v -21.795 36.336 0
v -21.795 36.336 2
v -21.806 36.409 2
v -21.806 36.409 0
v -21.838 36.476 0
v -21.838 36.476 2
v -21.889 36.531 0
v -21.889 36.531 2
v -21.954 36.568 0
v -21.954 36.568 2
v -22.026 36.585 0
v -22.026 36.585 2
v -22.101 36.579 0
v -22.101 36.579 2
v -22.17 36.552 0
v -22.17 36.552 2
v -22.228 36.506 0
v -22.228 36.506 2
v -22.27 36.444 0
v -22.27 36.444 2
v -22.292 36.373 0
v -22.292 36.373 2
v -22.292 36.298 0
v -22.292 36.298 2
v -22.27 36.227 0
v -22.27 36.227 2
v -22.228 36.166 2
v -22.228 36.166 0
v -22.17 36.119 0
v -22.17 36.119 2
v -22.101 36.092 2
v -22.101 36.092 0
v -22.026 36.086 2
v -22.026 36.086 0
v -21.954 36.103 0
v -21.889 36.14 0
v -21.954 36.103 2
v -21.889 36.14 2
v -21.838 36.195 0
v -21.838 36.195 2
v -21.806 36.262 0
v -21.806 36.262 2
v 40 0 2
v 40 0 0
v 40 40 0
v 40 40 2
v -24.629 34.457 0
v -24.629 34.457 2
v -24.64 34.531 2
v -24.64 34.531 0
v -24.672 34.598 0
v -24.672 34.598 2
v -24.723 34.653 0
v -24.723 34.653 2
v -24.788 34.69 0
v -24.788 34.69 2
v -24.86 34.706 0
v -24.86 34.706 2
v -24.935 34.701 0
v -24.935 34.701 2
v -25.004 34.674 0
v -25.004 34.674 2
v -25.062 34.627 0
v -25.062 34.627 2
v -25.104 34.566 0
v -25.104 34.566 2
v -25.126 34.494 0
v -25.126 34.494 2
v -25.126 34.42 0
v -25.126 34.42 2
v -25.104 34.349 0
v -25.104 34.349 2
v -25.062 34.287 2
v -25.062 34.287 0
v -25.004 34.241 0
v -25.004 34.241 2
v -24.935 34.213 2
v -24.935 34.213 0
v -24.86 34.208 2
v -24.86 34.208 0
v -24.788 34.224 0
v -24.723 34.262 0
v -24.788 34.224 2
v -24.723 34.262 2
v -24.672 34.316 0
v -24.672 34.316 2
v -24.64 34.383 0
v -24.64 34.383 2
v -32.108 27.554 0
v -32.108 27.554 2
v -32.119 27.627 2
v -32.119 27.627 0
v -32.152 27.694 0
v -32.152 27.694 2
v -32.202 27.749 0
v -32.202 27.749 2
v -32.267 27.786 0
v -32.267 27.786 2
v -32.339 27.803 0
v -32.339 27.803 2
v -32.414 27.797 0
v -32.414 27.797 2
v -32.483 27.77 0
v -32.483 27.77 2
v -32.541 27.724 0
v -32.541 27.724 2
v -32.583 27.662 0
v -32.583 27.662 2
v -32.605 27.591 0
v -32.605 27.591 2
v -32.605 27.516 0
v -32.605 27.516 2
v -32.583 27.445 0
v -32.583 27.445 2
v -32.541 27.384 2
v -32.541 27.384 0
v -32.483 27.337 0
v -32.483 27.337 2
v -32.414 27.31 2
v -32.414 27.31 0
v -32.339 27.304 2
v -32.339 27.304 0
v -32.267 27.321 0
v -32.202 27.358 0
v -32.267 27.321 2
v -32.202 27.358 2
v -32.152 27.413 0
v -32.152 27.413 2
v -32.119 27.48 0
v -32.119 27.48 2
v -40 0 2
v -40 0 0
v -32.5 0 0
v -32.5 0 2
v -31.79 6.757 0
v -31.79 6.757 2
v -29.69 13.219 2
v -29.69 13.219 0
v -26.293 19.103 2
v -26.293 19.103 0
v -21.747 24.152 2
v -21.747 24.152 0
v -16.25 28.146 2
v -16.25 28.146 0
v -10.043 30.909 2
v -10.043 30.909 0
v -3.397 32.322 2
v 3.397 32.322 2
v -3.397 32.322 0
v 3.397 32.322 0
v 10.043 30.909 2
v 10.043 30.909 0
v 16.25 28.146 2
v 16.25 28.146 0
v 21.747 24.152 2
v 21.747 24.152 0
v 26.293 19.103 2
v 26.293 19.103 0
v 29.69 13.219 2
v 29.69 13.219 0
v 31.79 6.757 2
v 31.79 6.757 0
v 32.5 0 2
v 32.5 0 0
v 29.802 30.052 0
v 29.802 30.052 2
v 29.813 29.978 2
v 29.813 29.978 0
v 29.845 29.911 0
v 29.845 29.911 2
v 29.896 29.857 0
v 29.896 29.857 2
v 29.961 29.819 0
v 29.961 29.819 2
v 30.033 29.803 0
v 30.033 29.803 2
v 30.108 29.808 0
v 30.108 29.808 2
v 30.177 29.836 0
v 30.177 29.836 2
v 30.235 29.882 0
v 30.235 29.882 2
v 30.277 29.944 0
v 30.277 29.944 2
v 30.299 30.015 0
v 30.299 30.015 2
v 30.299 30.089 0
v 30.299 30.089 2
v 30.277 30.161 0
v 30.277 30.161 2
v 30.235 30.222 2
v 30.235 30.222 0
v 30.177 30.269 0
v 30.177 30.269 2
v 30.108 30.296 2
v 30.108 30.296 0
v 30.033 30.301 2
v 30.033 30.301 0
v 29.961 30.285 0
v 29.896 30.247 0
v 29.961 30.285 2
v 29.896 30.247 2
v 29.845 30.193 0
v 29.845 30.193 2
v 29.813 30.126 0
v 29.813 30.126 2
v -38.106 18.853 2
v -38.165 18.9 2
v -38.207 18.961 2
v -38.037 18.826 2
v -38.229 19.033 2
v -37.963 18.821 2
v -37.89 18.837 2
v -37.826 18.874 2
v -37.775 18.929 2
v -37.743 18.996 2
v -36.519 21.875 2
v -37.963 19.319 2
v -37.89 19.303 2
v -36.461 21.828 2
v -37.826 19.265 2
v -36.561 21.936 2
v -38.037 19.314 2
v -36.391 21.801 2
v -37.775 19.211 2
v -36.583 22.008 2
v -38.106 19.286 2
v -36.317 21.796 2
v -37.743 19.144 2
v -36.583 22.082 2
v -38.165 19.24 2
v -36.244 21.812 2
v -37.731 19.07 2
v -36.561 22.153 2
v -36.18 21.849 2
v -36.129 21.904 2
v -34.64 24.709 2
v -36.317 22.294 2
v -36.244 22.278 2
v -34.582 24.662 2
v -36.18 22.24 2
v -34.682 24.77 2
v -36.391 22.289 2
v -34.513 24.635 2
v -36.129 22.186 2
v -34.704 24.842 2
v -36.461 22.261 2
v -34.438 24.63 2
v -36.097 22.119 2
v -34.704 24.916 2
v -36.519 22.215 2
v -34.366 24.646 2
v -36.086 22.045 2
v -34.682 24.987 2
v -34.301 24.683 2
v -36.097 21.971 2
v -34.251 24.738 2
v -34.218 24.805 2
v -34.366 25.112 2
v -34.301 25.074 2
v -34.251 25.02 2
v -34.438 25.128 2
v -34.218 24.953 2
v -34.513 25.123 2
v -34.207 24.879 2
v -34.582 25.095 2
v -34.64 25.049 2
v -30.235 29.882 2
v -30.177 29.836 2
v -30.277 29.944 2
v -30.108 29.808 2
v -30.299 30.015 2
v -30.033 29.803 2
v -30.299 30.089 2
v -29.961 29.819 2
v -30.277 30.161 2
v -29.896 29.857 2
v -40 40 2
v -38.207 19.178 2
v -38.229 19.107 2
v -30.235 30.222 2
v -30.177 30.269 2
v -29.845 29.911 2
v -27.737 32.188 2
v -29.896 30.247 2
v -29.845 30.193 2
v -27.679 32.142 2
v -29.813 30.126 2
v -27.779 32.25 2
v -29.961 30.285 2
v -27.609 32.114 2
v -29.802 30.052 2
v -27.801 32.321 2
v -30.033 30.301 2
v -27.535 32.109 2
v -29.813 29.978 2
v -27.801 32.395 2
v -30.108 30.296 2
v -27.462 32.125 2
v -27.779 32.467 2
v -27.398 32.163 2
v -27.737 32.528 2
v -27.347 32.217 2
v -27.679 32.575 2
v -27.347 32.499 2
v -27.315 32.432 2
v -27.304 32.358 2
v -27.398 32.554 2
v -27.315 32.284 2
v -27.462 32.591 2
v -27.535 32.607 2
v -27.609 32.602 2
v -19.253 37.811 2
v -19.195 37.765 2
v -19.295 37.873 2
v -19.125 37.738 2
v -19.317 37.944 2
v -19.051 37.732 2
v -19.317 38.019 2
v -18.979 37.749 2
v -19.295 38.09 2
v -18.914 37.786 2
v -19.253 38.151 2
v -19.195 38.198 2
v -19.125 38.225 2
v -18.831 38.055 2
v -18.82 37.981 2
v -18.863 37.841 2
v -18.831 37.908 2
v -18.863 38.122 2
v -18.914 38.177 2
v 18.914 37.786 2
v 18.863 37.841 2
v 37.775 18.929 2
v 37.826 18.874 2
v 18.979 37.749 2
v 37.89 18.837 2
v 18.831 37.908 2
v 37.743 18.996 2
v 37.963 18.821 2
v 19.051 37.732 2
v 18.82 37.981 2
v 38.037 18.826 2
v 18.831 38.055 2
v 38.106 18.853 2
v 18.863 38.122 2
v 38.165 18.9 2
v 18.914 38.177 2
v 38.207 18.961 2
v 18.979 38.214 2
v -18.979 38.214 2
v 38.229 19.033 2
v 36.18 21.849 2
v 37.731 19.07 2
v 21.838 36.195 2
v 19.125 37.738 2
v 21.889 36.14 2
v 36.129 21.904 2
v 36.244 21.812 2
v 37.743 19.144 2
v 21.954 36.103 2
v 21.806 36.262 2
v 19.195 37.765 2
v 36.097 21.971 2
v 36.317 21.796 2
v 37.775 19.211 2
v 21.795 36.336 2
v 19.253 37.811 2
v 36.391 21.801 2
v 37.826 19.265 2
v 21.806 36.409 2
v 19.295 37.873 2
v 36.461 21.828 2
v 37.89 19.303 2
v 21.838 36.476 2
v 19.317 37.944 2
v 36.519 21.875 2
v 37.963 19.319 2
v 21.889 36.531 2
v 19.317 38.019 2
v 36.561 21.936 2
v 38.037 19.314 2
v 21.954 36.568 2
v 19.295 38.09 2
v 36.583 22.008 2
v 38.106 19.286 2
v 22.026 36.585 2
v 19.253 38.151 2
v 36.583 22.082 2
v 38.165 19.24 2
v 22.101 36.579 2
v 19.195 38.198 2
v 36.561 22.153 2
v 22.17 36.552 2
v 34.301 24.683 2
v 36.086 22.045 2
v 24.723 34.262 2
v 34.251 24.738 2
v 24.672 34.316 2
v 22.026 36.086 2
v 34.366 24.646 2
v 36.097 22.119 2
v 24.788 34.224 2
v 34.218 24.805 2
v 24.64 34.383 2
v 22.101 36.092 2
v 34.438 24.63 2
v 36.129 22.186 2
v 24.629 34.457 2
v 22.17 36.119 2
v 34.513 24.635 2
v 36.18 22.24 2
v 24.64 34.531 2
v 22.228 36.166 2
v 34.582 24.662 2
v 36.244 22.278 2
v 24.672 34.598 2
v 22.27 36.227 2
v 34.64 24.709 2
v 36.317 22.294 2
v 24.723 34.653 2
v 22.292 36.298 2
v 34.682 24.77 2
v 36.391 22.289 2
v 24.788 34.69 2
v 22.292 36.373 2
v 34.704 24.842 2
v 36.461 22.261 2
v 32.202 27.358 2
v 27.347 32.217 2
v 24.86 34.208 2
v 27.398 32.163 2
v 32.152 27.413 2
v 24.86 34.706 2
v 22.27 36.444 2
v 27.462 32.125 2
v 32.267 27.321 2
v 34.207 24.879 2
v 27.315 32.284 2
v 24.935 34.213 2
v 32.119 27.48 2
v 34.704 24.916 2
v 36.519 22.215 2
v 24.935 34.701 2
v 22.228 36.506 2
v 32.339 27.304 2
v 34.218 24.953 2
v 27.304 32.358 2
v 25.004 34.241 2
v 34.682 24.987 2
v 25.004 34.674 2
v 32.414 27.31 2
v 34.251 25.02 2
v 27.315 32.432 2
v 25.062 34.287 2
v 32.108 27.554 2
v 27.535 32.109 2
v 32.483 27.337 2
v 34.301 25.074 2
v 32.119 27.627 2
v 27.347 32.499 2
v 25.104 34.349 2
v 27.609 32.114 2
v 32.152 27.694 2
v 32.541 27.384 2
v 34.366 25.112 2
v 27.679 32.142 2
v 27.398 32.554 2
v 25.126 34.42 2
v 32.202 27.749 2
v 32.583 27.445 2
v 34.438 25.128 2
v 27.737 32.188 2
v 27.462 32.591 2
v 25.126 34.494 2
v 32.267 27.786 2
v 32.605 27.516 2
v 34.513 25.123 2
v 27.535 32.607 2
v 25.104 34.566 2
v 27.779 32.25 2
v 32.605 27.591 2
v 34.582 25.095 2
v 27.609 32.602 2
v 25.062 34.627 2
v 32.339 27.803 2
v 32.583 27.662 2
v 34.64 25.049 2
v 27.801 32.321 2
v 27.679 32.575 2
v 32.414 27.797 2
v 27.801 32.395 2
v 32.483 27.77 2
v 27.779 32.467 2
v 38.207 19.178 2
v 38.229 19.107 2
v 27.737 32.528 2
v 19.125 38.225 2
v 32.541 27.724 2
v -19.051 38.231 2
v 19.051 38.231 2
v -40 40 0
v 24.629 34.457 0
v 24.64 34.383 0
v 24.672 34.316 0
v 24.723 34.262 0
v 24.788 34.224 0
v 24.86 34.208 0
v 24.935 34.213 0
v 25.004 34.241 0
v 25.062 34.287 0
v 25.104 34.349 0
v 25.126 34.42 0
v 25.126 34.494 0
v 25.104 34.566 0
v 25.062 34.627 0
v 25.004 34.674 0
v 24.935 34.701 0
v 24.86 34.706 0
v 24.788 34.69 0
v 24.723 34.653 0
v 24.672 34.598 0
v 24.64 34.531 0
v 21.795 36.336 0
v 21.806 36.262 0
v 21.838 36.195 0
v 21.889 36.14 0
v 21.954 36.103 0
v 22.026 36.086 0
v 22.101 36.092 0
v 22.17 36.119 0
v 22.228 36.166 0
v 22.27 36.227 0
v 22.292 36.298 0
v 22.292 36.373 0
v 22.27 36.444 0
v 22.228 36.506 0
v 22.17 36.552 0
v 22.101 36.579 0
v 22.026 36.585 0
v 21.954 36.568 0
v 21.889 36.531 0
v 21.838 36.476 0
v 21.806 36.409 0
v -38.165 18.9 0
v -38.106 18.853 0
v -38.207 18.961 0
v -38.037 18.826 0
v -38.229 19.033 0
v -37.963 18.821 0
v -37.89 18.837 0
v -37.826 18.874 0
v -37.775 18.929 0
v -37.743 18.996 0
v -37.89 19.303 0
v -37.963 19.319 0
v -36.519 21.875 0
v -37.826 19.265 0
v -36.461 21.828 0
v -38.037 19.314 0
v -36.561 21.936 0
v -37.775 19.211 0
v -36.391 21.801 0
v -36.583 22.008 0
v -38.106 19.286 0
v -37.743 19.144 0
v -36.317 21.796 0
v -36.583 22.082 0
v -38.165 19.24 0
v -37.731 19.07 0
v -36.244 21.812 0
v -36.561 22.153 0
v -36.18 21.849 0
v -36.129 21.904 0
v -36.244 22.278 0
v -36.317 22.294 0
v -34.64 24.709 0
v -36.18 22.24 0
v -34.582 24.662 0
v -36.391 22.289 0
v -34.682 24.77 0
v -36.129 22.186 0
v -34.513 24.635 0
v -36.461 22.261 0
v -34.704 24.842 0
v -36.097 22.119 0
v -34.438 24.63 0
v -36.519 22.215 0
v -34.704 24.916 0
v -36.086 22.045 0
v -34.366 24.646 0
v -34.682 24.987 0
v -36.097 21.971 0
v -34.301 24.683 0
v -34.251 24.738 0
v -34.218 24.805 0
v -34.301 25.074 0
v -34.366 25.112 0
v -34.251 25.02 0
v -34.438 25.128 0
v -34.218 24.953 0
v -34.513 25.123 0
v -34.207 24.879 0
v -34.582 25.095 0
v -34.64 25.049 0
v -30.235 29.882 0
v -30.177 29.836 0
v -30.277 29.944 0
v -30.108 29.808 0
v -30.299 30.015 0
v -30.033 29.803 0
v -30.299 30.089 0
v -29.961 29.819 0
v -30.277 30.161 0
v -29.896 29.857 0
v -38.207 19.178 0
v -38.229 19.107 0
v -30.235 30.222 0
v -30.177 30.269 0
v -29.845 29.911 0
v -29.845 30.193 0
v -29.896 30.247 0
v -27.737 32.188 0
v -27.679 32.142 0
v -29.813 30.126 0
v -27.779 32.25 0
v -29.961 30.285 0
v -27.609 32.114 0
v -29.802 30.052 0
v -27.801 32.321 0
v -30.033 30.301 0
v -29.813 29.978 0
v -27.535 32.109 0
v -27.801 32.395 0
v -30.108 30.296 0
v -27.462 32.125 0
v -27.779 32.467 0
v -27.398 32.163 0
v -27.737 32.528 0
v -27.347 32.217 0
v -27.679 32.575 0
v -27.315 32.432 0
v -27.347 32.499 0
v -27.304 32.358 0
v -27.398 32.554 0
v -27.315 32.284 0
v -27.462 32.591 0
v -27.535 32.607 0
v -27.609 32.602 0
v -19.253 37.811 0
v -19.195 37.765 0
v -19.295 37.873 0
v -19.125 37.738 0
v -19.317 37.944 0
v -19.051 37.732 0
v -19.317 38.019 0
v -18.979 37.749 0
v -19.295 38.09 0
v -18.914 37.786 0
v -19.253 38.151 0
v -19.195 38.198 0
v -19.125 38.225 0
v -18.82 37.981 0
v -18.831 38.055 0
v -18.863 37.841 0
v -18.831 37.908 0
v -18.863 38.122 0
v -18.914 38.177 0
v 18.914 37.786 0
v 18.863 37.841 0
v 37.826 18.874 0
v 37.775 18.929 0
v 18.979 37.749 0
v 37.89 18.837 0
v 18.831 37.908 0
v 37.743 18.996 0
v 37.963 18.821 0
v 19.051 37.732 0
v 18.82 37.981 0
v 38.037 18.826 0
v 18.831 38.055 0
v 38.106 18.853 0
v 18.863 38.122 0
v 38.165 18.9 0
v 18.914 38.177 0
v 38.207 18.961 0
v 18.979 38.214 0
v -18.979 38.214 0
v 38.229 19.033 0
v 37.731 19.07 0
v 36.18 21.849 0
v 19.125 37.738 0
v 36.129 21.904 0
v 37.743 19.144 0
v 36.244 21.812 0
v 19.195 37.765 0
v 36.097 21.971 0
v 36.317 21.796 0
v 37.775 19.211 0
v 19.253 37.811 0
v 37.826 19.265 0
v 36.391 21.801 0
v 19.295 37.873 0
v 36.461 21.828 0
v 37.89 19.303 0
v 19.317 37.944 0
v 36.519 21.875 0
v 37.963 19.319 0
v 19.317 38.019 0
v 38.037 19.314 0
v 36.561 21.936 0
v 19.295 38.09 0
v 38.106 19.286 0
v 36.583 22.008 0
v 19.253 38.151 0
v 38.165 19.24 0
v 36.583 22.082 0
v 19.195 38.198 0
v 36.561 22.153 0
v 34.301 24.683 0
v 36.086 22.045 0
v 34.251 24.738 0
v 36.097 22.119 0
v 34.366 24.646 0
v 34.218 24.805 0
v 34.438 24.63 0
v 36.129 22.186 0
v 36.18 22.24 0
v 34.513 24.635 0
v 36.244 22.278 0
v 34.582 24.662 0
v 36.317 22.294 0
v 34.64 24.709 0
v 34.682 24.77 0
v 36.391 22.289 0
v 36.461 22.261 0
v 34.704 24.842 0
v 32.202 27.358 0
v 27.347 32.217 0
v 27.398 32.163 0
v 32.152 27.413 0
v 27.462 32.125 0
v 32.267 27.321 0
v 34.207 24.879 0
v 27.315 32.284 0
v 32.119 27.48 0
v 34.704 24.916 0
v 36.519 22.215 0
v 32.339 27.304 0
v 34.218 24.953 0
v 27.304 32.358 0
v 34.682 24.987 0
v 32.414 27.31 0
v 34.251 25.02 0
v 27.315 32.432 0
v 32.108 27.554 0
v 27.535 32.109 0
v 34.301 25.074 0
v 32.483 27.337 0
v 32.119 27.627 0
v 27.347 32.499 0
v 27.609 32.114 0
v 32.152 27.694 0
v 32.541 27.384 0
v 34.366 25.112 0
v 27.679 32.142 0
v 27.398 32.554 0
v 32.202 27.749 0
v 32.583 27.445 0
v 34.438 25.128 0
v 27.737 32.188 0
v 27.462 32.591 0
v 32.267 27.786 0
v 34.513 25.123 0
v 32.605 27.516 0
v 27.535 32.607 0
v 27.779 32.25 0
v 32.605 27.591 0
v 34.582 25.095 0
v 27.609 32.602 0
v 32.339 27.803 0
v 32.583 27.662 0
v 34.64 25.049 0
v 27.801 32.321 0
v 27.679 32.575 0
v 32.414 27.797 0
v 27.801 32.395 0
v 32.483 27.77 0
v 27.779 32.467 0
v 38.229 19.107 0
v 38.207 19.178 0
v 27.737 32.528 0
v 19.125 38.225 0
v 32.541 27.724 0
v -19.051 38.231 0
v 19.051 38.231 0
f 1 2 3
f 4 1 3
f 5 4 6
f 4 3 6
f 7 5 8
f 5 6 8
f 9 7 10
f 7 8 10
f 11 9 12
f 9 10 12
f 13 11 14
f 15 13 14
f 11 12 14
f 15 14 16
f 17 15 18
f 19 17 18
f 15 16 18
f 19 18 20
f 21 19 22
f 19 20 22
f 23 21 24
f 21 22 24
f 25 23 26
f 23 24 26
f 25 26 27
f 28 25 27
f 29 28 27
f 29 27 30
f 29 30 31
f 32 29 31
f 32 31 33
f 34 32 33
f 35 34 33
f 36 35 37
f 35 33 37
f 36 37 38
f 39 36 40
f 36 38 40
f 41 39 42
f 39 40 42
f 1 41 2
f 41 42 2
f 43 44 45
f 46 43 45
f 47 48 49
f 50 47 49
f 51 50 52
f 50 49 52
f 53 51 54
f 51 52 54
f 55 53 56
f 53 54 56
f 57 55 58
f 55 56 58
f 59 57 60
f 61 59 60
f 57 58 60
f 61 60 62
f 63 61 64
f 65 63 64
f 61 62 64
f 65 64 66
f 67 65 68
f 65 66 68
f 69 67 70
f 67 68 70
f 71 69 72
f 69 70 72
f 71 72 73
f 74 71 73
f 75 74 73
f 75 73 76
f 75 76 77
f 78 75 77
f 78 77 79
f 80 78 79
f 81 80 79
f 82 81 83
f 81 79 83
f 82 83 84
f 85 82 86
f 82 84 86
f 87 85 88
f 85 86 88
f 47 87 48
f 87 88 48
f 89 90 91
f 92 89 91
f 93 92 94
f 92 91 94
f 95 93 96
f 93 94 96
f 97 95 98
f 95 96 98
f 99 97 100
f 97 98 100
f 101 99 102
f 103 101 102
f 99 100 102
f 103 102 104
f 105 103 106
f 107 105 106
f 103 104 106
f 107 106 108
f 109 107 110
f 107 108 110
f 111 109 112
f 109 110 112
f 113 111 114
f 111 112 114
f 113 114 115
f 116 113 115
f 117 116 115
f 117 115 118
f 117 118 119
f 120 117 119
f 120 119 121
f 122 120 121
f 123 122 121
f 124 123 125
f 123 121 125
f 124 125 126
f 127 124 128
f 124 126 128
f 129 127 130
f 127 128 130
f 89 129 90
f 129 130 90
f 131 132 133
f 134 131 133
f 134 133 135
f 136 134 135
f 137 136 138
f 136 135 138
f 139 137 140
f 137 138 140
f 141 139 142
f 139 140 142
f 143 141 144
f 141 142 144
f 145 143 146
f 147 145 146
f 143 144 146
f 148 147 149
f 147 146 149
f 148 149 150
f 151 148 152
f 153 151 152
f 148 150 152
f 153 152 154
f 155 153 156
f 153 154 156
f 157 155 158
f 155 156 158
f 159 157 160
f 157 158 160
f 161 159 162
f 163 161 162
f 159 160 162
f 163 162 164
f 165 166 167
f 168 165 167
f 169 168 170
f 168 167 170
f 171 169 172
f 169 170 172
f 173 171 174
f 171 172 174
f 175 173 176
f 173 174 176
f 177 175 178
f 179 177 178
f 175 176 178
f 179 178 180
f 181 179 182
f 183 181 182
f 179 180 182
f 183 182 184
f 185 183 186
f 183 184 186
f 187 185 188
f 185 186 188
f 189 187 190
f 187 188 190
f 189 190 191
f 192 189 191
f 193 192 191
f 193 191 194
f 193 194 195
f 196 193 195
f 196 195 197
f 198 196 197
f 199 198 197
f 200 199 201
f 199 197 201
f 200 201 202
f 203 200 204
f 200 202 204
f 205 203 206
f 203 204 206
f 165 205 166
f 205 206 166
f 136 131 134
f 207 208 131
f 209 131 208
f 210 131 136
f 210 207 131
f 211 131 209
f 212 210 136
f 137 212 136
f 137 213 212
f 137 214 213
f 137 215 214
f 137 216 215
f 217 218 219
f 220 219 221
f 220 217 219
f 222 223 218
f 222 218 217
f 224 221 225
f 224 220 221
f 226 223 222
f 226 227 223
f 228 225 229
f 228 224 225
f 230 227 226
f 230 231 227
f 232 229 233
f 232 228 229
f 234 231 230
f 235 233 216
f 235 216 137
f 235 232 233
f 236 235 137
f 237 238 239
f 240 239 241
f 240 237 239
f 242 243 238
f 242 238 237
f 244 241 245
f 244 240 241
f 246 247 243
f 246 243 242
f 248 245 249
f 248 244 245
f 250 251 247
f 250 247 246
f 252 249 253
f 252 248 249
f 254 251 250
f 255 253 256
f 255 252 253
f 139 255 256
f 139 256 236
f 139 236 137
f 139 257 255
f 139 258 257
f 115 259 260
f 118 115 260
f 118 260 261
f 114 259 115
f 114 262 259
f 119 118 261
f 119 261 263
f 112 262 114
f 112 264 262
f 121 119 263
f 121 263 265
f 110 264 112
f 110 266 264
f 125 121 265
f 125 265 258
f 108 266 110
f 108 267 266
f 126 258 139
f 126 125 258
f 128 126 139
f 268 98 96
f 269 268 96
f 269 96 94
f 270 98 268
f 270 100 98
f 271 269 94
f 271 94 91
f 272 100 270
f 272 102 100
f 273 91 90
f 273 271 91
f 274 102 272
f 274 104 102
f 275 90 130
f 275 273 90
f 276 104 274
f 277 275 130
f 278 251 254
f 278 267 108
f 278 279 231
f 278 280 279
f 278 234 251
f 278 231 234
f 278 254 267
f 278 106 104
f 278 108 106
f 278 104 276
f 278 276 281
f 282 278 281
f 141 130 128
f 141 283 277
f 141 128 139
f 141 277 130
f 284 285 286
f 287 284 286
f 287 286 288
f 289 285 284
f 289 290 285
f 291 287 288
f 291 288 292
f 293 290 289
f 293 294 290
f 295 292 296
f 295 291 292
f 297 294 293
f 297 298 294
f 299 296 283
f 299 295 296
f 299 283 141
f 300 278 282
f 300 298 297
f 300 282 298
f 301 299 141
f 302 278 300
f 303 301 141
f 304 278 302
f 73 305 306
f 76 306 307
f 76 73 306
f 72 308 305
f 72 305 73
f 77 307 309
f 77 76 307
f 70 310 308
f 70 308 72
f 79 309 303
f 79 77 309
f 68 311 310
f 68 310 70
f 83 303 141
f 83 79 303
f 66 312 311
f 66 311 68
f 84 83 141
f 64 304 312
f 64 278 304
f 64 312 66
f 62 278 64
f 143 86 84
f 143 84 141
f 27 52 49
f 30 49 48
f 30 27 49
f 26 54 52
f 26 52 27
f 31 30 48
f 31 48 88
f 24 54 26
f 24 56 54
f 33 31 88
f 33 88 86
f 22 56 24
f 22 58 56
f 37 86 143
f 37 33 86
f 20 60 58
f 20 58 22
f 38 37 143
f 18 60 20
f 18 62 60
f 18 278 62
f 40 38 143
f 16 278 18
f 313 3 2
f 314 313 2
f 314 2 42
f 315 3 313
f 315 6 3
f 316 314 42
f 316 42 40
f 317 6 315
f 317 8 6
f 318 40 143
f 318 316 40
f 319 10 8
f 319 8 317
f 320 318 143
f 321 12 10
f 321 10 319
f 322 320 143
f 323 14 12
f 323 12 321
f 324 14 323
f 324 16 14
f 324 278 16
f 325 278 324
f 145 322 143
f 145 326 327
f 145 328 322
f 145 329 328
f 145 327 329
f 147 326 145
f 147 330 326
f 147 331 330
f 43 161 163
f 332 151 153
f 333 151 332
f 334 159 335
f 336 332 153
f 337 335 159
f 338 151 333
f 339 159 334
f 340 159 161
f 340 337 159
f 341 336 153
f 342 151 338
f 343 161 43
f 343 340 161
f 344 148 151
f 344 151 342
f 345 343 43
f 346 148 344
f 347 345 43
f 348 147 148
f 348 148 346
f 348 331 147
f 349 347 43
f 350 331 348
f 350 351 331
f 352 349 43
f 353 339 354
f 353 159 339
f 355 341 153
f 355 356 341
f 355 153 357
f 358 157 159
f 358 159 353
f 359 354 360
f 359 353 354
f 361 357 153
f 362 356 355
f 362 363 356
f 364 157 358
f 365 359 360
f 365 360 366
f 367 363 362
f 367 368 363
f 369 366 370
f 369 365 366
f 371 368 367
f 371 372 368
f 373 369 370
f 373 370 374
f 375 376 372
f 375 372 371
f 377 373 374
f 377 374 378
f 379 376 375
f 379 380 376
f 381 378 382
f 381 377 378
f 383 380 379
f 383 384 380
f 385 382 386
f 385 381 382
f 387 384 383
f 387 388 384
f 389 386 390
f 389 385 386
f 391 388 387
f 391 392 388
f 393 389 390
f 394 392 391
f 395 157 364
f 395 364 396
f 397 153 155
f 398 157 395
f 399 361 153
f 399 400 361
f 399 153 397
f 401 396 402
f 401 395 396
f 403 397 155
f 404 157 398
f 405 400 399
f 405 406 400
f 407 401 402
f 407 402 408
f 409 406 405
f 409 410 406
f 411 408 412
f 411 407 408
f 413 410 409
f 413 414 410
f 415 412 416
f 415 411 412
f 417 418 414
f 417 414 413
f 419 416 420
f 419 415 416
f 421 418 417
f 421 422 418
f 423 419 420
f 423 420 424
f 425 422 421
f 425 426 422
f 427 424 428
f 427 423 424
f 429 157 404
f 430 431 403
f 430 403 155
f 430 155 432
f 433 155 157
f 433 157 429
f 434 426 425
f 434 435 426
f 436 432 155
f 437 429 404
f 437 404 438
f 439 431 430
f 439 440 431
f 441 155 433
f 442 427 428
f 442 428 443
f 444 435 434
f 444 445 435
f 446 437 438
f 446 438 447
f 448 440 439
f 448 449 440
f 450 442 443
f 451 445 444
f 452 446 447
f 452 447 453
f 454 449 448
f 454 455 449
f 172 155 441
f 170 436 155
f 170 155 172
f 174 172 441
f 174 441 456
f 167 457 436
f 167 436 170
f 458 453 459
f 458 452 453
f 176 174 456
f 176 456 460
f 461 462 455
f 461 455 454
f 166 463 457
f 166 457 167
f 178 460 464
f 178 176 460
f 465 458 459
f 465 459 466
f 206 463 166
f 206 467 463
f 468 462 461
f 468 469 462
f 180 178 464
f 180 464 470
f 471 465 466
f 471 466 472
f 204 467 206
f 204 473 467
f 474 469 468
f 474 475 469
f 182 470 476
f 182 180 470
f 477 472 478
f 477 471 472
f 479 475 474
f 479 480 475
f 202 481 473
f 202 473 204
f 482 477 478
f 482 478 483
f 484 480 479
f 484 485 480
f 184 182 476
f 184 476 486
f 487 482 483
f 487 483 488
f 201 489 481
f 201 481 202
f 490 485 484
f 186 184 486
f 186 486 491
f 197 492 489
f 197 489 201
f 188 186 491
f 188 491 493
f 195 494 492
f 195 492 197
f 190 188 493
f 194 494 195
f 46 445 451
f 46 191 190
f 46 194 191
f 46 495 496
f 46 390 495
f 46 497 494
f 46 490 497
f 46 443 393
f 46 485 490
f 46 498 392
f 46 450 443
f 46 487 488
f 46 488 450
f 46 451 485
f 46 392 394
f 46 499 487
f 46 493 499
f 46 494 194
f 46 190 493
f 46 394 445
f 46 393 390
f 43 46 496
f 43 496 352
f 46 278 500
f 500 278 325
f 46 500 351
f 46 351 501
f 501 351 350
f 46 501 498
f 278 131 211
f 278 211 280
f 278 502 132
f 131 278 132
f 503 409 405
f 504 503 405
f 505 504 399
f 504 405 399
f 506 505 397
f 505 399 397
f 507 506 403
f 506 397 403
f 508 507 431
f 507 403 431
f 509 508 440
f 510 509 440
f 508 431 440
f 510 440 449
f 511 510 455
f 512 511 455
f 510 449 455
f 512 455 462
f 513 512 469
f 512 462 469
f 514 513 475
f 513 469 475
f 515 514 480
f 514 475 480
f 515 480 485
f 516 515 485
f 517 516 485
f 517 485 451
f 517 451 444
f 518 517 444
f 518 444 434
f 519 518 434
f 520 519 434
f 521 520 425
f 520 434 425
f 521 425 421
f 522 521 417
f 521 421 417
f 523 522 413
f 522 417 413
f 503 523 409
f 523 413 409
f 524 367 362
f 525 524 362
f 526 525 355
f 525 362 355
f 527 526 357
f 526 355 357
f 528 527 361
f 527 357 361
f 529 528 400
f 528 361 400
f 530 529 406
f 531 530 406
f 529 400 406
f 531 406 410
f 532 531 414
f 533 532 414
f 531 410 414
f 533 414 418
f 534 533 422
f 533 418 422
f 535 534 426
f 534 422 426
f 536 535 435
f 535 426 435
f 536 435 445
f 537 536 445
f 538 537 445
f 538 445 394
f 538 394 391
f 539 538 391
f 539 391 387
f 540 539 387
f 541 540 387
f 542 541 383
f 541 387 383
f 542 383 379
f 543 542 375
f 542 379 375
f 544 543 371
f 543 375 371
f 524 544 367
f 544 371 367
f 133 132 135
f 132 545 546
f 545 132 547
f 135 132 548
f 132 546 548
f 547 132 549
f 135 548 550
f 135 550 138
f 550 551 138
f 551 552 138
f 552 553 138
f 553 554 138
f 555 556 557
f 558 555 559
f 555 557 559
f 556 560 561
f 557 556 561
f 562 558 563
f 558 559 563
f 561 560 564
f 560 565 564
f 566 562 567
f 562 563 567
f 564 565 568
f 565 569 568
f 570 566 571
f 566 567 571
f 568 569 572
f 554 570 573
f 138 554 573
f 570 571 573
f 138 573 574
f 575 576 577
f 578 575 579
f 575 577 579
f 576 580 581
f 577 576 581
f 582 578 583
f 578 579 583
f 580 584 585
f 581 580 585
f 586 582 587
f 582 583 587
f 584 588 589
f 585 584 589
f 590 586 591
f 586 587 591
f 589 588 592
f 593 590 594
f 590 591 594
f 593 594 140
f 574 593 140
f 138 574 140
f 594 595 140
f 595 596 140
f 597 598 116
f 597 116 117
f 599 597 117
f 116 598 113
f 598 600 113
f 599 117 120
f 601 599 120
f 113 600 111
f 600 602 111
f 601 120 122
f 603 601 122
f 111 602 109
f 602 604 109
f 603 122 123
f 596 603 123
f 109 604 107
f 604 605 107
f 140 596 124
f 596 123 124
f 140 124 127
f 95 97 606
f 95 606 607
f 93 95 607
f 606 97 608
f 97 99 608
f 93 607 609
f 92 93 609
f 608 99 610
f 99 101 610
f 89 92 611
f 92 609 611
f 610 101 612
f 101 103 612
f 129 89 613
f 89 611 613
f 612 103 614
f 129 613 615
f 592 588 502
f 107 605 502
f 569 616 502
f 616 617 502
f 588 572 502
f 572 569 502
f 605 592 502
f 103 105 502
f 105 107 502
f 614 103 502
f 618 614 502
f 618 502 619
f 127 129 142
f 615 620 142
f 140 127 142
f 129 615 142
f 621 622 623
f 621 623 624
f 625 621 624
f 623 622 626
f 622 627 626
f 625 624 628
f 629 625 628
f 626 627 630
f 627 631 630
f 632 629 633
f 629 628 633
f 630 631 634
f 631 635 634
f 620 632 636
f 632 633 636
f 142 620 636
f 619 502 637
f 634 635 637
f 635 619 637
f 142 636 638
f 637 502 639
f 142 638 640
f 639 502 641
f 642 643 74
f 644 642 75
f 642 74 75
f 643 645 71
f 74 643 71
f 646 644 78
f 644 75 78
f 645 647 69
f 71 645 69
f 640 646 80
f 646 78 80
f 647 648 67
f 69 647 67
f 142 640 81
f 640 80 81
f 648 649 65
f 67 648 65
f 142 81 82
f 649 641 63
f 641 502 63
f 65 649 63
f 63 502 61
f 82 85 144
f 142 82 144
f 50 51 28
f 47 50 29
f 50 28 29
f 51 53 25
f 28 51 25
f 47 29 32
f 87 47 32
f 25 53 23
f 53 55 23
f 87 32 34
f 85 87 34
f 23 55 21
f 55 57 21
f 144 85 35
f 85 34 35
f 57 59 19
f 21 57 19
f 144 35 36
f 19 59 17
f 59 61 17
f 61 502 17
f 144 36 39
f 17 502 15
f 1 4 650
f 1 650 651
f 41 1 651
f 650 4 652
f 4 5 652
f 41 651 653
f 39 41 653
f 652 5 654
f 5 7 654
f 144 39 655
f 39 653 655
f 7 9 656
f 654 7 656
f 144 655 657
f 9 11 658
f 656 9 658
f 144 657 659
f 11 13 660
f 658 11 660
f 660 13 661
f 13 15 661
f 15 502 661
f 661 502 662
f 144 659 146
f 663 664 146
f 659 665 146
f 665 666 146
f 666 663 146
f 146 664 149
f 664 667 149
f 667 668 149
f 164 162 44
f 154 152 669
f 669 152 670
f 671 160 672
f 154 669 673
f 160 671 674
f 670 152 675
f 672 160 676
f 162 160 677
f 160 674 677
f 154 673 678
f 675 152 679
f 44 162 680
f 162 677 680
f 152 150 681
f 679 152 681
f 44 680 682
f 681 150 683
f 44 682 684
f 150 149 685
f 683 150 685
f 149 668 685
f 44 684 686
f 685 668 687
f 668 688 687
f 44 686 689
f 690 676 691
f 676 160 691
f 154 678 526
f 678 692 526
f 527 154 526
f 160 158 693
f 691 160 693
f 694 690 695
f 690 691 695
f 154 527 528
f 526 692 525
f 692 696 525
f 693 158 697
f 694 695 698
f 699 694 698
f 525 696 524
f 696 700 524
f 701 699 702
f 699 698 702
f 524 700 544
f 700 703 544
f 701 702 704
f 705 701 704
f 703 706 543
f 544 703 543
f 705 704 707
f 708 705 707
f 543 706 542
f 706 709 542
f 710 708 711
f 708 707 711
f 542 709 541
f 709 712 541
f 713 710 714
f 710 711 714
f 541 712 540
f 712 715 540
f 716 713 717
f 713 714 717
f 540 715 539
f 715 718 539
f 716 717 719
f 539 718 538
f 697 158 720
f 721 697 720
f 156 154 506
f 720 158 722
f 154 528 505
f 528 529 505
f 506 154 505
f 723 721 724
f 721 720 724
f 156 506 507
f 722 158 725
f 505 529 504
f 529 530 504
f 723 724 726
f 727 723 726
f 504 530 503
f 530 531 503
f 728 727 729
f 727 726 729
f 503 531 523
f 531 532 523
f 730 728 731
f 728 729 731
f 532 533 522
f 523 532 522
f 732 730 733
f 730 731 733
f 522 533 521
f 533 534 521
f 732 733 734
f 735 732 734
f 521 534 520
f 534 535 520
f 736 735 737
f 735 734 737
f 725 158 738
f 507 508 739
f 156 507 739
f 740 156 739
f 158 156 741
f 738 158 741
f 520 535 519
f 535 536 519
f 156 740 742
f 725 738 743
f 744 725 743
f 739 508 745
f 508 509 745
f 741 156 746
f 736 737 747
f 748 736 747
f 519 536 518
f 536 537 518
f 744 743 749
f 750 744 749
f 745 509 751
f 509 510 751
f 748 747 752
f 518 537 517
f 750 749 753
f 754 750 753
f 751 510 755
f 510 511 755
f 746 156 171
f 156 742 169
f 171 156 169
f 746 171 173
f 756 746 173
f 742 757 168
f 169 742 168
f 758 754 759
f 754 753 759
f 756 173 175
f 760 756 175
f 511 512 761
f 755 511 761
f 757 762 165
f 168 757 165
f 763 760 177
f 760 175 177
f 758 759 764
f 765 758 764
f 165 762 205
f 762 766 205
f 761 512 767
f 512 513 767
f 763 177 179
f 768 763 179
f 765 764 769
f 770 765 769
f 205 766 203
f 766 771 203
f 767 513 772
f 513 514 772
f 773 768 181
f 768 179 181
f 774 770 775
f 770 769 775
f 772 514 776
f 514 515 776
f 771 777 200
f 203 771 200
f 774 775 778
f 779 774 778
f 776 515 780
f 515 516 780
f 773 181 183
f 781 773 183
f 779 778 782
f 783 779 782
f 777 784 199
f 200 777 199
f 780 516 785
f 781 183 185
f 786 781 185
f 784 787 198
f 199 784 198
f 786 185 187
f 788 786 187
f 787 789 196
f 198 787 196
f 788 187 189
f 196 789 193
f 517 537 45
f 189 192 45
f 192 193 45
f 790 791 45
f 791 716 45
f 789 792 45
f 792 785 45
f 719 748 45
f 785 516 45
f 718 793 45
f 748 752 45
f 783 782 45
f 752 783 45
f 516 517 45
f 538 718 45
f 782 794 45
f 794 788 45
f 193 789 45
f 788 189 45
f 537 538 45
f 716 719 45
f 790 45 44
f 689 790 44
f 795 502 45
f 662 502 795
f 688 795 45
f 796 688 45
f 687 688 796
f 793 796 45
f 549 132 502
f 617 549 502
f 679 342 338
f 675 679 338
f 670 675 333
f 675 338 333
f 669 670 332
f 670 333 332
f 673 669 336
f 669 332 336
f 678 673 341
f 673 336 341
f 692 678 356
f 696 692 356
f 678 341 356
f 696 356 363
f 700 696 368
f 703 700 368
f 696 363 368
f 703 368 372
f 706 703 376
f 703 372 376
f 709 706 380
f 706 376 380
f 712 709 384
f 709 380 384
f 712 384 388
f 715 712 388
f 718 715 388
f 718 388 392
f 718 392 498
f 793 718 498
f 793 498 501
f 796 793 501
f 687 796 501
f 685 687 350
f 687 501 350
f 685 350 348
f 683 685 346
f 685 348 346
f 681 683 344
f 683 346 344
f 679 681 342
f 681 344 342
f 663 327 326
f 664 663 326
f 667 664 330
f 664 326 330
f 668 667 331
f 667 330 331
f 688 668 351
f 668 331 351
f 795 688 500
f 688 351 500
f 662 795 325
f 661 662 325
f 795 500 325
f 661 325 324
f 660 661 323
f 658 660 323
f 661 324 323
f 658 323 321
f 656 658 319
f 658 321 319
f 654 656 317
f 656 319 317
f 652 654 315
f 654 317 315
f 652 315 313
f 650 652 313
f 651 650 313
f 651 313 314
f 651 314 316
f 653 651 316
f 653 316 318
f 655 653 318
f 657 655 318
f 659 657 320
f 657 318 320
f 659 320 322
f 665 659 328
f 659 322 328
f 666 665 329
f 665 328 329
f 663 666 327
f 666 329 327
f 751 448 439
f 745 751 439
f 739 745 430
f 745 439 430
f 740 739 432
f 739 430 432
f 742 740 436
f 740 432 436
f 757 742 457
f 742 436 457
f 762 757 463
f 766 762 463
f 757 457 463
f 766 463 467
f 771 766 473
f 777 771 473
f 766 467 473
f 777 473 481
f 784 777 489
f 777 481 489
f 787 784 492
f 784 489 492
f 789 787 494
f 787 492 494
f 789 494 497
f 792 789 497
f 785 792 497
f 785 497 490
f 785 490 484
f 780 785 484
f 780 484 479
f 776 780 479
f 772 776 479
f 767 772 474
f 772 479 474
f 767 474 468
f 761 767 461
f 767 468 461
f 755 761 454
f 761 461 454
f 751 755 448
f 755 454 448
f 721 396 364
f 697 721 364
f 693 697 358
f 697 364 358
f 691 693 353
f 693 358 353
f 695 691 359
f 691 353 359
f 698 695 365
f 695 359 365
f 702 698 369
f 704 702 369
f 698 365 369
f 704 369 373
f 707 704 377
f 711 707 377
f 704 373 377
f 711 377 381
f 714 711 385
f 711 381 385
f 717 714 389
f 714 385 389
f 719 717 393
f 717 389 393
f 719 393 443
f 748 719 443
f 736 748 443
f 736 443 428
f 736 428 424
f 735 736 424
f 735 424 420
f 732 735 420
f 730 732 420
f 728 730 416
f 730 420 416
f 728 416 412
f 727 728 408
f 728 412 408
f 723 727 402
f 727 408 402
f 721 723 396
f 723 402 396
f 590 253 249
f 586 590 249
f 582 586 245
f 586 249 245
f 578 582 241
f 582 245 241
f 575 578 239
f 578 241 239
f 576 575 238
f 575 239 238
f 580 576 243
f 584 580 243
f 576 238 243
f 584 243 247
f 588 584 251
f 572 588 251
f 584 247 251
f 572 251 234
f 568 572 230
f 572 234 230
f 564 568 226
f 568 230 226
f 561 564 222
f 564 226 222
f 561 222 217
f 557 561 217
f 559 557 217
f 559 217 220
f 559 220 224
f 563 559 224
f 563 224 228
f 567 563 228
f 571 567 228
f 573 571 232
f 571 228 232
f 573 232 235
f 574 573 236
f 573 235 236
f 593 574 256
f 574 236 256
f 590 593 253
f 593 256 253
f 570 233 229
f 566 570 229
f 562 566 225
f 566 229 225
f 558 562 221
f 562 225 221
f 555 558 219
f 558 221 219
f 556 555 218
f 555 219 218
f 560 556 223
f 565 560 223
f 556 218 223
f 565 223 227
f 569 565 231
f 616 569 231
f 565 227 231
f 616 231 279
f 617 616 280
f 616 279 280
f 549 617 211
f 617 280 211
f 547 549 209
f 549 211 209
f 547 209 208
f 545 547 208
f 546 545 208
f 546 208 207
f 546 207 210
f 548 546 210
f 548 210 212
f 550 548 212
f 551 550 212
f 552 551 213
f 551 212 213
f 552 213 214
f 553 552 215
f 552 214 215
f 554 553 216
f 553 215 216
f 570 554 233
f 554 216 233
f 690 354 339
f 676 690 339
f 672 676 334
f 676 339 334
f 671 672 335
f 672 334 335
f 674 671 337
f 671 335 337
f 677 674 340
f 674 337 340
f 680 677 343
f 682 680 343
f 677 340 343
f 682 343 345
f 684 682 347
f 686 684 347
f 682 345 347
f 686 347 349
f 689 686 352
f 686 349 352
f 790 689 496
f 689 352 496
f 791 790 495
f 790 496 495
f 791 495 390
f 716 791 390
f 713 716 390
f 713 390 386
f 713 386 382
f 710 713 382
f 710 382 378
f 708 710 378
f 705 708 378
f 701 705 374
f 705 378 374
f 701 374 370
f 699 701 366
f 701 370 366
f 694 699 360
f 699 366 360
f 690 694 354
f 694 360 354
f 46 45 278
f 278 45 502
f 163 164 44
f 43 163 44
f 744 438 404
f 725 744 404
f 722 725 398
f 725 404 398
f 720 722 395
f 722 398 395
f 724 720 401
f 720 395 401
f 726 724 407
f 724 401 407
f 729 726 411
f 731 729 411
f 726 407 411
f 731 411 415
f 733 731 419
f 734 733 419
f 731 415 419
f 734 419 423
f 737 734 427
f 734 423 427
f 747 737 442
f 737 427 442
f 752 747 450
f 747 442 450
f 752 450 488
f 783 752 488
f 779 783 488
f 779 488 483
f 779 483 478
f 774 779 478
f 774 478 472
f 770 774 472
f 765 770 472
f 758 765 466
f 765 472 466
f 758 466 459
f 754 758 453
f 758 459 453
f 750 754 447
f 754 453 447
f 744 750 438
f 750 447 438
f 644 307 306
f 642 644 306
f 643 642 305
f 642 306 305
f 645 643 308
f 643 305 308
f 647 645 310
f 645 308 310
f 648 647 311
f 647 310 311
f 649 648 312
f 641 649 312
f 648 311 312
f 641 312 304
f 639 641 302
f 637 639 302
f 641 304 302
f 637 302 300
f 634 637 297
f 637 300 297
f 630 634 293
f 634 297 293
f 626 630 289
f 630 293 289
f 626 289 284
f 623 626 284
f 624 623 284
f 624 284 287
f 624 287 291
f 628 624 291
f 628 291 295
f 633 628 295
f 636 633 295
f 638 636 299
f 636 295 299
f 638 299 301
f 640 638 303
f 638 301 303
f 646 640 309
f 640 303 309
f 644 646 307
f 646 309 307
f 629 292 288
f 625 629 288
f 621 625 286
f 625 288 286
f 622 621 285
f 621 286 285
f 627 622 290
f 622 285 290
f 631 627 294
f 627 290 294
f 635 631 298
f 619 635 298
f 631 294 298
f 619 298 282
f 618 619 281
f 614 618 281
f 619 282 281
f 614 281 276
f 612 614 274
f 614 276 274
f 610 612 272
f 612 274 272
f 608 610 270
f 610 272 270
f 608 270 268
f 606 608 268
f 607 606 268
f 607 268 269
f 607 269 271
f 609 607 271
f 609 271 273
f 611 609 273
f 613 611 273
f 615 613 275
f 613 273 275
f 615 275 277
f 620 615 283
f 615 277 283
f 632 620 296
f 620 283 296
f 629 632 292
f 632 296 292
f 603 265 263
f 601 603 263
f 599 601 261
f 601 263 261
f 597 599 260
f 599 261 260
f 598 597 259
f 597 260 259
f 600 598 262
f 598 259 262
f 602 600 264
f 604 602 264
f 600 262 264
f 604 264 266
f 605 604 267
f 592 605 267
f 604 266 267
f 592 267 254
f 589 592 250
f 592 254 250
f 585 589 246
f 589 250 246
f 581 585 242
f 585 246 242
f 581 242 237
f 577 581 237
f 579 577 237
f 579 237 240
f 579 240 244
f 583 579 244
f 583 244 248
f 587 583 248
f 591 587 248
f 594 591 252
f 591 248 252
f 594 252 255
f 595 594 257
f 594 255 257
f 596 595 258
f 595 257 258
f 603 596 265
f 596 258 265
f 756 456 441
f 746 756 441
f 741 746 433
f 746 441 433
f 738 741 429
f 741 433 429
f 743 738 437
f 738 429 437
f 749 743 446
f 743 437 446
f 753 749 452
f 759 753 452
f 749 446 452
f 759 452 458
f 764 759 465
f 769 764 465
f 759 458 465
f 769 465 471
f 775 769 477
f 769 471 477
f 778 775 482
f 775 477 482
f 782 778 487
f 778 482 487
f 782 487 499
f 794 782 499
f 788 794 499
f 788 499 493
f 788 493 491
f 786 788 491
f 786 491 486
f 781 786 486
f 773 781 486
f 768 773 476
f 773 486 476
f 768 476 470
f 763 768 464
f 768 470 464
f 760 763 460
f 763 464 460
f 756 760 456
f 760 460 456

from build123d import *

# Parameters (mm, degrees)
BOSS_EXTRU_1_DEPTH      = 2
ESQUISSE2_R             = 0.25
ENL_V_MAT_EXTRU_1_DEPTH = 2


with BuildPart() as part:
    # Esquisse1 → Boss.-Extru.1 (new body)
    with BuildSketch(Plane.XY):
        with BuildLine():
            Line((40, 0), (40, 40))
            Line((40, 40), (-40, 40))
            Line((-40, 40), (-40, 0))
            Line((-40, 0), (-32.5, 0))
            ThreePointArc((-32.5, 0), (0, 32.5), (32.5, 0))
            Line((32.5, 0), (40, 0))
        make_face()
    extrude(amount=BOSS_EXTRU_1_DEPTH)

    # Esquisse2 → Enlèv. mat.-Extru.1 (cut)
    with BuildSketch(Plane.XY.offset(2)):
        with Locations((-37.981453947, 19.069849399)):
            Circle(ESQUISSE2_R)
        with Locations((-36.335546301, 22.04491041)):
            Circle(ESQUISSE2_R)
        with Locations((-34.457091159, 24.878883995)):
            Circle(ESQUISSE2_R)
        with Locations((-32.358110634, 27.553632723)):
            Circle(ESQUISSE2_R)
        with Locations((-30.0520382, 30.0520382)):
            Circle(ESQUISSE2_R)
        with Locations((-27.553632723, 32.358110634)):
            Circle(ESQUISSE2_R)
        with Locations((-24.878883995, 34.457091159)):
            Circle(ESQUISSE2_R)
        with Locations((-22.04491041, 36.335546301)):
            Circle(ESQUISSE2_R)
        with Locations((-19.069849399, 37.981453947)):
            Circle(ESQUISSE2_R)
        with Locations(Location((19.069849399, 37.981453947, 0), (0, 0, 180))):
            Circle(ESQUISSE2_R)
        with Locations(Location((22.04491041, 36.335546301, 0), (0, 0, 180))):
            Circle(ESQUISSE2_R)
        with Locations(Location((24.878883995, 34.457091159, 0), (0, 0, 180))):
            Circle(ESQUISSE2_R)
        with Locations(Location((27.553632723, 32.358110634, 0), (0, 0, 180))):
            Circle(ESQUISSE2_R)
        with Locations(Location((30.0520382, 30.0520382, 0), (0, 0, 180))):
            Circle(ESQUISSE2_R)
        with Locations(Location((32.358110634, 27.553632723, 0), (0, 0, 180))):
            Circle(ESQUISSE2_R)
        with Locations(Location((34.457091159, 24.878883995, 0), (0, 0, 180))):
            Circle(ESQUISSE2_R)
        with Locations(Location((36.335546301, 22.04491041, 0), (0, 0, 180))):
            Circle(ESQUISSE2_R)
        with Locations(Location((37.981453947, 19.069849399, 0), (0, 0, 180))):
            Circle(ESQUISSE2_R)
    extrude(amount=-ENL_V_MAT_EXTRU_1_DEPTH, mode=Mode.SUBTRACT)


solid = part.part
